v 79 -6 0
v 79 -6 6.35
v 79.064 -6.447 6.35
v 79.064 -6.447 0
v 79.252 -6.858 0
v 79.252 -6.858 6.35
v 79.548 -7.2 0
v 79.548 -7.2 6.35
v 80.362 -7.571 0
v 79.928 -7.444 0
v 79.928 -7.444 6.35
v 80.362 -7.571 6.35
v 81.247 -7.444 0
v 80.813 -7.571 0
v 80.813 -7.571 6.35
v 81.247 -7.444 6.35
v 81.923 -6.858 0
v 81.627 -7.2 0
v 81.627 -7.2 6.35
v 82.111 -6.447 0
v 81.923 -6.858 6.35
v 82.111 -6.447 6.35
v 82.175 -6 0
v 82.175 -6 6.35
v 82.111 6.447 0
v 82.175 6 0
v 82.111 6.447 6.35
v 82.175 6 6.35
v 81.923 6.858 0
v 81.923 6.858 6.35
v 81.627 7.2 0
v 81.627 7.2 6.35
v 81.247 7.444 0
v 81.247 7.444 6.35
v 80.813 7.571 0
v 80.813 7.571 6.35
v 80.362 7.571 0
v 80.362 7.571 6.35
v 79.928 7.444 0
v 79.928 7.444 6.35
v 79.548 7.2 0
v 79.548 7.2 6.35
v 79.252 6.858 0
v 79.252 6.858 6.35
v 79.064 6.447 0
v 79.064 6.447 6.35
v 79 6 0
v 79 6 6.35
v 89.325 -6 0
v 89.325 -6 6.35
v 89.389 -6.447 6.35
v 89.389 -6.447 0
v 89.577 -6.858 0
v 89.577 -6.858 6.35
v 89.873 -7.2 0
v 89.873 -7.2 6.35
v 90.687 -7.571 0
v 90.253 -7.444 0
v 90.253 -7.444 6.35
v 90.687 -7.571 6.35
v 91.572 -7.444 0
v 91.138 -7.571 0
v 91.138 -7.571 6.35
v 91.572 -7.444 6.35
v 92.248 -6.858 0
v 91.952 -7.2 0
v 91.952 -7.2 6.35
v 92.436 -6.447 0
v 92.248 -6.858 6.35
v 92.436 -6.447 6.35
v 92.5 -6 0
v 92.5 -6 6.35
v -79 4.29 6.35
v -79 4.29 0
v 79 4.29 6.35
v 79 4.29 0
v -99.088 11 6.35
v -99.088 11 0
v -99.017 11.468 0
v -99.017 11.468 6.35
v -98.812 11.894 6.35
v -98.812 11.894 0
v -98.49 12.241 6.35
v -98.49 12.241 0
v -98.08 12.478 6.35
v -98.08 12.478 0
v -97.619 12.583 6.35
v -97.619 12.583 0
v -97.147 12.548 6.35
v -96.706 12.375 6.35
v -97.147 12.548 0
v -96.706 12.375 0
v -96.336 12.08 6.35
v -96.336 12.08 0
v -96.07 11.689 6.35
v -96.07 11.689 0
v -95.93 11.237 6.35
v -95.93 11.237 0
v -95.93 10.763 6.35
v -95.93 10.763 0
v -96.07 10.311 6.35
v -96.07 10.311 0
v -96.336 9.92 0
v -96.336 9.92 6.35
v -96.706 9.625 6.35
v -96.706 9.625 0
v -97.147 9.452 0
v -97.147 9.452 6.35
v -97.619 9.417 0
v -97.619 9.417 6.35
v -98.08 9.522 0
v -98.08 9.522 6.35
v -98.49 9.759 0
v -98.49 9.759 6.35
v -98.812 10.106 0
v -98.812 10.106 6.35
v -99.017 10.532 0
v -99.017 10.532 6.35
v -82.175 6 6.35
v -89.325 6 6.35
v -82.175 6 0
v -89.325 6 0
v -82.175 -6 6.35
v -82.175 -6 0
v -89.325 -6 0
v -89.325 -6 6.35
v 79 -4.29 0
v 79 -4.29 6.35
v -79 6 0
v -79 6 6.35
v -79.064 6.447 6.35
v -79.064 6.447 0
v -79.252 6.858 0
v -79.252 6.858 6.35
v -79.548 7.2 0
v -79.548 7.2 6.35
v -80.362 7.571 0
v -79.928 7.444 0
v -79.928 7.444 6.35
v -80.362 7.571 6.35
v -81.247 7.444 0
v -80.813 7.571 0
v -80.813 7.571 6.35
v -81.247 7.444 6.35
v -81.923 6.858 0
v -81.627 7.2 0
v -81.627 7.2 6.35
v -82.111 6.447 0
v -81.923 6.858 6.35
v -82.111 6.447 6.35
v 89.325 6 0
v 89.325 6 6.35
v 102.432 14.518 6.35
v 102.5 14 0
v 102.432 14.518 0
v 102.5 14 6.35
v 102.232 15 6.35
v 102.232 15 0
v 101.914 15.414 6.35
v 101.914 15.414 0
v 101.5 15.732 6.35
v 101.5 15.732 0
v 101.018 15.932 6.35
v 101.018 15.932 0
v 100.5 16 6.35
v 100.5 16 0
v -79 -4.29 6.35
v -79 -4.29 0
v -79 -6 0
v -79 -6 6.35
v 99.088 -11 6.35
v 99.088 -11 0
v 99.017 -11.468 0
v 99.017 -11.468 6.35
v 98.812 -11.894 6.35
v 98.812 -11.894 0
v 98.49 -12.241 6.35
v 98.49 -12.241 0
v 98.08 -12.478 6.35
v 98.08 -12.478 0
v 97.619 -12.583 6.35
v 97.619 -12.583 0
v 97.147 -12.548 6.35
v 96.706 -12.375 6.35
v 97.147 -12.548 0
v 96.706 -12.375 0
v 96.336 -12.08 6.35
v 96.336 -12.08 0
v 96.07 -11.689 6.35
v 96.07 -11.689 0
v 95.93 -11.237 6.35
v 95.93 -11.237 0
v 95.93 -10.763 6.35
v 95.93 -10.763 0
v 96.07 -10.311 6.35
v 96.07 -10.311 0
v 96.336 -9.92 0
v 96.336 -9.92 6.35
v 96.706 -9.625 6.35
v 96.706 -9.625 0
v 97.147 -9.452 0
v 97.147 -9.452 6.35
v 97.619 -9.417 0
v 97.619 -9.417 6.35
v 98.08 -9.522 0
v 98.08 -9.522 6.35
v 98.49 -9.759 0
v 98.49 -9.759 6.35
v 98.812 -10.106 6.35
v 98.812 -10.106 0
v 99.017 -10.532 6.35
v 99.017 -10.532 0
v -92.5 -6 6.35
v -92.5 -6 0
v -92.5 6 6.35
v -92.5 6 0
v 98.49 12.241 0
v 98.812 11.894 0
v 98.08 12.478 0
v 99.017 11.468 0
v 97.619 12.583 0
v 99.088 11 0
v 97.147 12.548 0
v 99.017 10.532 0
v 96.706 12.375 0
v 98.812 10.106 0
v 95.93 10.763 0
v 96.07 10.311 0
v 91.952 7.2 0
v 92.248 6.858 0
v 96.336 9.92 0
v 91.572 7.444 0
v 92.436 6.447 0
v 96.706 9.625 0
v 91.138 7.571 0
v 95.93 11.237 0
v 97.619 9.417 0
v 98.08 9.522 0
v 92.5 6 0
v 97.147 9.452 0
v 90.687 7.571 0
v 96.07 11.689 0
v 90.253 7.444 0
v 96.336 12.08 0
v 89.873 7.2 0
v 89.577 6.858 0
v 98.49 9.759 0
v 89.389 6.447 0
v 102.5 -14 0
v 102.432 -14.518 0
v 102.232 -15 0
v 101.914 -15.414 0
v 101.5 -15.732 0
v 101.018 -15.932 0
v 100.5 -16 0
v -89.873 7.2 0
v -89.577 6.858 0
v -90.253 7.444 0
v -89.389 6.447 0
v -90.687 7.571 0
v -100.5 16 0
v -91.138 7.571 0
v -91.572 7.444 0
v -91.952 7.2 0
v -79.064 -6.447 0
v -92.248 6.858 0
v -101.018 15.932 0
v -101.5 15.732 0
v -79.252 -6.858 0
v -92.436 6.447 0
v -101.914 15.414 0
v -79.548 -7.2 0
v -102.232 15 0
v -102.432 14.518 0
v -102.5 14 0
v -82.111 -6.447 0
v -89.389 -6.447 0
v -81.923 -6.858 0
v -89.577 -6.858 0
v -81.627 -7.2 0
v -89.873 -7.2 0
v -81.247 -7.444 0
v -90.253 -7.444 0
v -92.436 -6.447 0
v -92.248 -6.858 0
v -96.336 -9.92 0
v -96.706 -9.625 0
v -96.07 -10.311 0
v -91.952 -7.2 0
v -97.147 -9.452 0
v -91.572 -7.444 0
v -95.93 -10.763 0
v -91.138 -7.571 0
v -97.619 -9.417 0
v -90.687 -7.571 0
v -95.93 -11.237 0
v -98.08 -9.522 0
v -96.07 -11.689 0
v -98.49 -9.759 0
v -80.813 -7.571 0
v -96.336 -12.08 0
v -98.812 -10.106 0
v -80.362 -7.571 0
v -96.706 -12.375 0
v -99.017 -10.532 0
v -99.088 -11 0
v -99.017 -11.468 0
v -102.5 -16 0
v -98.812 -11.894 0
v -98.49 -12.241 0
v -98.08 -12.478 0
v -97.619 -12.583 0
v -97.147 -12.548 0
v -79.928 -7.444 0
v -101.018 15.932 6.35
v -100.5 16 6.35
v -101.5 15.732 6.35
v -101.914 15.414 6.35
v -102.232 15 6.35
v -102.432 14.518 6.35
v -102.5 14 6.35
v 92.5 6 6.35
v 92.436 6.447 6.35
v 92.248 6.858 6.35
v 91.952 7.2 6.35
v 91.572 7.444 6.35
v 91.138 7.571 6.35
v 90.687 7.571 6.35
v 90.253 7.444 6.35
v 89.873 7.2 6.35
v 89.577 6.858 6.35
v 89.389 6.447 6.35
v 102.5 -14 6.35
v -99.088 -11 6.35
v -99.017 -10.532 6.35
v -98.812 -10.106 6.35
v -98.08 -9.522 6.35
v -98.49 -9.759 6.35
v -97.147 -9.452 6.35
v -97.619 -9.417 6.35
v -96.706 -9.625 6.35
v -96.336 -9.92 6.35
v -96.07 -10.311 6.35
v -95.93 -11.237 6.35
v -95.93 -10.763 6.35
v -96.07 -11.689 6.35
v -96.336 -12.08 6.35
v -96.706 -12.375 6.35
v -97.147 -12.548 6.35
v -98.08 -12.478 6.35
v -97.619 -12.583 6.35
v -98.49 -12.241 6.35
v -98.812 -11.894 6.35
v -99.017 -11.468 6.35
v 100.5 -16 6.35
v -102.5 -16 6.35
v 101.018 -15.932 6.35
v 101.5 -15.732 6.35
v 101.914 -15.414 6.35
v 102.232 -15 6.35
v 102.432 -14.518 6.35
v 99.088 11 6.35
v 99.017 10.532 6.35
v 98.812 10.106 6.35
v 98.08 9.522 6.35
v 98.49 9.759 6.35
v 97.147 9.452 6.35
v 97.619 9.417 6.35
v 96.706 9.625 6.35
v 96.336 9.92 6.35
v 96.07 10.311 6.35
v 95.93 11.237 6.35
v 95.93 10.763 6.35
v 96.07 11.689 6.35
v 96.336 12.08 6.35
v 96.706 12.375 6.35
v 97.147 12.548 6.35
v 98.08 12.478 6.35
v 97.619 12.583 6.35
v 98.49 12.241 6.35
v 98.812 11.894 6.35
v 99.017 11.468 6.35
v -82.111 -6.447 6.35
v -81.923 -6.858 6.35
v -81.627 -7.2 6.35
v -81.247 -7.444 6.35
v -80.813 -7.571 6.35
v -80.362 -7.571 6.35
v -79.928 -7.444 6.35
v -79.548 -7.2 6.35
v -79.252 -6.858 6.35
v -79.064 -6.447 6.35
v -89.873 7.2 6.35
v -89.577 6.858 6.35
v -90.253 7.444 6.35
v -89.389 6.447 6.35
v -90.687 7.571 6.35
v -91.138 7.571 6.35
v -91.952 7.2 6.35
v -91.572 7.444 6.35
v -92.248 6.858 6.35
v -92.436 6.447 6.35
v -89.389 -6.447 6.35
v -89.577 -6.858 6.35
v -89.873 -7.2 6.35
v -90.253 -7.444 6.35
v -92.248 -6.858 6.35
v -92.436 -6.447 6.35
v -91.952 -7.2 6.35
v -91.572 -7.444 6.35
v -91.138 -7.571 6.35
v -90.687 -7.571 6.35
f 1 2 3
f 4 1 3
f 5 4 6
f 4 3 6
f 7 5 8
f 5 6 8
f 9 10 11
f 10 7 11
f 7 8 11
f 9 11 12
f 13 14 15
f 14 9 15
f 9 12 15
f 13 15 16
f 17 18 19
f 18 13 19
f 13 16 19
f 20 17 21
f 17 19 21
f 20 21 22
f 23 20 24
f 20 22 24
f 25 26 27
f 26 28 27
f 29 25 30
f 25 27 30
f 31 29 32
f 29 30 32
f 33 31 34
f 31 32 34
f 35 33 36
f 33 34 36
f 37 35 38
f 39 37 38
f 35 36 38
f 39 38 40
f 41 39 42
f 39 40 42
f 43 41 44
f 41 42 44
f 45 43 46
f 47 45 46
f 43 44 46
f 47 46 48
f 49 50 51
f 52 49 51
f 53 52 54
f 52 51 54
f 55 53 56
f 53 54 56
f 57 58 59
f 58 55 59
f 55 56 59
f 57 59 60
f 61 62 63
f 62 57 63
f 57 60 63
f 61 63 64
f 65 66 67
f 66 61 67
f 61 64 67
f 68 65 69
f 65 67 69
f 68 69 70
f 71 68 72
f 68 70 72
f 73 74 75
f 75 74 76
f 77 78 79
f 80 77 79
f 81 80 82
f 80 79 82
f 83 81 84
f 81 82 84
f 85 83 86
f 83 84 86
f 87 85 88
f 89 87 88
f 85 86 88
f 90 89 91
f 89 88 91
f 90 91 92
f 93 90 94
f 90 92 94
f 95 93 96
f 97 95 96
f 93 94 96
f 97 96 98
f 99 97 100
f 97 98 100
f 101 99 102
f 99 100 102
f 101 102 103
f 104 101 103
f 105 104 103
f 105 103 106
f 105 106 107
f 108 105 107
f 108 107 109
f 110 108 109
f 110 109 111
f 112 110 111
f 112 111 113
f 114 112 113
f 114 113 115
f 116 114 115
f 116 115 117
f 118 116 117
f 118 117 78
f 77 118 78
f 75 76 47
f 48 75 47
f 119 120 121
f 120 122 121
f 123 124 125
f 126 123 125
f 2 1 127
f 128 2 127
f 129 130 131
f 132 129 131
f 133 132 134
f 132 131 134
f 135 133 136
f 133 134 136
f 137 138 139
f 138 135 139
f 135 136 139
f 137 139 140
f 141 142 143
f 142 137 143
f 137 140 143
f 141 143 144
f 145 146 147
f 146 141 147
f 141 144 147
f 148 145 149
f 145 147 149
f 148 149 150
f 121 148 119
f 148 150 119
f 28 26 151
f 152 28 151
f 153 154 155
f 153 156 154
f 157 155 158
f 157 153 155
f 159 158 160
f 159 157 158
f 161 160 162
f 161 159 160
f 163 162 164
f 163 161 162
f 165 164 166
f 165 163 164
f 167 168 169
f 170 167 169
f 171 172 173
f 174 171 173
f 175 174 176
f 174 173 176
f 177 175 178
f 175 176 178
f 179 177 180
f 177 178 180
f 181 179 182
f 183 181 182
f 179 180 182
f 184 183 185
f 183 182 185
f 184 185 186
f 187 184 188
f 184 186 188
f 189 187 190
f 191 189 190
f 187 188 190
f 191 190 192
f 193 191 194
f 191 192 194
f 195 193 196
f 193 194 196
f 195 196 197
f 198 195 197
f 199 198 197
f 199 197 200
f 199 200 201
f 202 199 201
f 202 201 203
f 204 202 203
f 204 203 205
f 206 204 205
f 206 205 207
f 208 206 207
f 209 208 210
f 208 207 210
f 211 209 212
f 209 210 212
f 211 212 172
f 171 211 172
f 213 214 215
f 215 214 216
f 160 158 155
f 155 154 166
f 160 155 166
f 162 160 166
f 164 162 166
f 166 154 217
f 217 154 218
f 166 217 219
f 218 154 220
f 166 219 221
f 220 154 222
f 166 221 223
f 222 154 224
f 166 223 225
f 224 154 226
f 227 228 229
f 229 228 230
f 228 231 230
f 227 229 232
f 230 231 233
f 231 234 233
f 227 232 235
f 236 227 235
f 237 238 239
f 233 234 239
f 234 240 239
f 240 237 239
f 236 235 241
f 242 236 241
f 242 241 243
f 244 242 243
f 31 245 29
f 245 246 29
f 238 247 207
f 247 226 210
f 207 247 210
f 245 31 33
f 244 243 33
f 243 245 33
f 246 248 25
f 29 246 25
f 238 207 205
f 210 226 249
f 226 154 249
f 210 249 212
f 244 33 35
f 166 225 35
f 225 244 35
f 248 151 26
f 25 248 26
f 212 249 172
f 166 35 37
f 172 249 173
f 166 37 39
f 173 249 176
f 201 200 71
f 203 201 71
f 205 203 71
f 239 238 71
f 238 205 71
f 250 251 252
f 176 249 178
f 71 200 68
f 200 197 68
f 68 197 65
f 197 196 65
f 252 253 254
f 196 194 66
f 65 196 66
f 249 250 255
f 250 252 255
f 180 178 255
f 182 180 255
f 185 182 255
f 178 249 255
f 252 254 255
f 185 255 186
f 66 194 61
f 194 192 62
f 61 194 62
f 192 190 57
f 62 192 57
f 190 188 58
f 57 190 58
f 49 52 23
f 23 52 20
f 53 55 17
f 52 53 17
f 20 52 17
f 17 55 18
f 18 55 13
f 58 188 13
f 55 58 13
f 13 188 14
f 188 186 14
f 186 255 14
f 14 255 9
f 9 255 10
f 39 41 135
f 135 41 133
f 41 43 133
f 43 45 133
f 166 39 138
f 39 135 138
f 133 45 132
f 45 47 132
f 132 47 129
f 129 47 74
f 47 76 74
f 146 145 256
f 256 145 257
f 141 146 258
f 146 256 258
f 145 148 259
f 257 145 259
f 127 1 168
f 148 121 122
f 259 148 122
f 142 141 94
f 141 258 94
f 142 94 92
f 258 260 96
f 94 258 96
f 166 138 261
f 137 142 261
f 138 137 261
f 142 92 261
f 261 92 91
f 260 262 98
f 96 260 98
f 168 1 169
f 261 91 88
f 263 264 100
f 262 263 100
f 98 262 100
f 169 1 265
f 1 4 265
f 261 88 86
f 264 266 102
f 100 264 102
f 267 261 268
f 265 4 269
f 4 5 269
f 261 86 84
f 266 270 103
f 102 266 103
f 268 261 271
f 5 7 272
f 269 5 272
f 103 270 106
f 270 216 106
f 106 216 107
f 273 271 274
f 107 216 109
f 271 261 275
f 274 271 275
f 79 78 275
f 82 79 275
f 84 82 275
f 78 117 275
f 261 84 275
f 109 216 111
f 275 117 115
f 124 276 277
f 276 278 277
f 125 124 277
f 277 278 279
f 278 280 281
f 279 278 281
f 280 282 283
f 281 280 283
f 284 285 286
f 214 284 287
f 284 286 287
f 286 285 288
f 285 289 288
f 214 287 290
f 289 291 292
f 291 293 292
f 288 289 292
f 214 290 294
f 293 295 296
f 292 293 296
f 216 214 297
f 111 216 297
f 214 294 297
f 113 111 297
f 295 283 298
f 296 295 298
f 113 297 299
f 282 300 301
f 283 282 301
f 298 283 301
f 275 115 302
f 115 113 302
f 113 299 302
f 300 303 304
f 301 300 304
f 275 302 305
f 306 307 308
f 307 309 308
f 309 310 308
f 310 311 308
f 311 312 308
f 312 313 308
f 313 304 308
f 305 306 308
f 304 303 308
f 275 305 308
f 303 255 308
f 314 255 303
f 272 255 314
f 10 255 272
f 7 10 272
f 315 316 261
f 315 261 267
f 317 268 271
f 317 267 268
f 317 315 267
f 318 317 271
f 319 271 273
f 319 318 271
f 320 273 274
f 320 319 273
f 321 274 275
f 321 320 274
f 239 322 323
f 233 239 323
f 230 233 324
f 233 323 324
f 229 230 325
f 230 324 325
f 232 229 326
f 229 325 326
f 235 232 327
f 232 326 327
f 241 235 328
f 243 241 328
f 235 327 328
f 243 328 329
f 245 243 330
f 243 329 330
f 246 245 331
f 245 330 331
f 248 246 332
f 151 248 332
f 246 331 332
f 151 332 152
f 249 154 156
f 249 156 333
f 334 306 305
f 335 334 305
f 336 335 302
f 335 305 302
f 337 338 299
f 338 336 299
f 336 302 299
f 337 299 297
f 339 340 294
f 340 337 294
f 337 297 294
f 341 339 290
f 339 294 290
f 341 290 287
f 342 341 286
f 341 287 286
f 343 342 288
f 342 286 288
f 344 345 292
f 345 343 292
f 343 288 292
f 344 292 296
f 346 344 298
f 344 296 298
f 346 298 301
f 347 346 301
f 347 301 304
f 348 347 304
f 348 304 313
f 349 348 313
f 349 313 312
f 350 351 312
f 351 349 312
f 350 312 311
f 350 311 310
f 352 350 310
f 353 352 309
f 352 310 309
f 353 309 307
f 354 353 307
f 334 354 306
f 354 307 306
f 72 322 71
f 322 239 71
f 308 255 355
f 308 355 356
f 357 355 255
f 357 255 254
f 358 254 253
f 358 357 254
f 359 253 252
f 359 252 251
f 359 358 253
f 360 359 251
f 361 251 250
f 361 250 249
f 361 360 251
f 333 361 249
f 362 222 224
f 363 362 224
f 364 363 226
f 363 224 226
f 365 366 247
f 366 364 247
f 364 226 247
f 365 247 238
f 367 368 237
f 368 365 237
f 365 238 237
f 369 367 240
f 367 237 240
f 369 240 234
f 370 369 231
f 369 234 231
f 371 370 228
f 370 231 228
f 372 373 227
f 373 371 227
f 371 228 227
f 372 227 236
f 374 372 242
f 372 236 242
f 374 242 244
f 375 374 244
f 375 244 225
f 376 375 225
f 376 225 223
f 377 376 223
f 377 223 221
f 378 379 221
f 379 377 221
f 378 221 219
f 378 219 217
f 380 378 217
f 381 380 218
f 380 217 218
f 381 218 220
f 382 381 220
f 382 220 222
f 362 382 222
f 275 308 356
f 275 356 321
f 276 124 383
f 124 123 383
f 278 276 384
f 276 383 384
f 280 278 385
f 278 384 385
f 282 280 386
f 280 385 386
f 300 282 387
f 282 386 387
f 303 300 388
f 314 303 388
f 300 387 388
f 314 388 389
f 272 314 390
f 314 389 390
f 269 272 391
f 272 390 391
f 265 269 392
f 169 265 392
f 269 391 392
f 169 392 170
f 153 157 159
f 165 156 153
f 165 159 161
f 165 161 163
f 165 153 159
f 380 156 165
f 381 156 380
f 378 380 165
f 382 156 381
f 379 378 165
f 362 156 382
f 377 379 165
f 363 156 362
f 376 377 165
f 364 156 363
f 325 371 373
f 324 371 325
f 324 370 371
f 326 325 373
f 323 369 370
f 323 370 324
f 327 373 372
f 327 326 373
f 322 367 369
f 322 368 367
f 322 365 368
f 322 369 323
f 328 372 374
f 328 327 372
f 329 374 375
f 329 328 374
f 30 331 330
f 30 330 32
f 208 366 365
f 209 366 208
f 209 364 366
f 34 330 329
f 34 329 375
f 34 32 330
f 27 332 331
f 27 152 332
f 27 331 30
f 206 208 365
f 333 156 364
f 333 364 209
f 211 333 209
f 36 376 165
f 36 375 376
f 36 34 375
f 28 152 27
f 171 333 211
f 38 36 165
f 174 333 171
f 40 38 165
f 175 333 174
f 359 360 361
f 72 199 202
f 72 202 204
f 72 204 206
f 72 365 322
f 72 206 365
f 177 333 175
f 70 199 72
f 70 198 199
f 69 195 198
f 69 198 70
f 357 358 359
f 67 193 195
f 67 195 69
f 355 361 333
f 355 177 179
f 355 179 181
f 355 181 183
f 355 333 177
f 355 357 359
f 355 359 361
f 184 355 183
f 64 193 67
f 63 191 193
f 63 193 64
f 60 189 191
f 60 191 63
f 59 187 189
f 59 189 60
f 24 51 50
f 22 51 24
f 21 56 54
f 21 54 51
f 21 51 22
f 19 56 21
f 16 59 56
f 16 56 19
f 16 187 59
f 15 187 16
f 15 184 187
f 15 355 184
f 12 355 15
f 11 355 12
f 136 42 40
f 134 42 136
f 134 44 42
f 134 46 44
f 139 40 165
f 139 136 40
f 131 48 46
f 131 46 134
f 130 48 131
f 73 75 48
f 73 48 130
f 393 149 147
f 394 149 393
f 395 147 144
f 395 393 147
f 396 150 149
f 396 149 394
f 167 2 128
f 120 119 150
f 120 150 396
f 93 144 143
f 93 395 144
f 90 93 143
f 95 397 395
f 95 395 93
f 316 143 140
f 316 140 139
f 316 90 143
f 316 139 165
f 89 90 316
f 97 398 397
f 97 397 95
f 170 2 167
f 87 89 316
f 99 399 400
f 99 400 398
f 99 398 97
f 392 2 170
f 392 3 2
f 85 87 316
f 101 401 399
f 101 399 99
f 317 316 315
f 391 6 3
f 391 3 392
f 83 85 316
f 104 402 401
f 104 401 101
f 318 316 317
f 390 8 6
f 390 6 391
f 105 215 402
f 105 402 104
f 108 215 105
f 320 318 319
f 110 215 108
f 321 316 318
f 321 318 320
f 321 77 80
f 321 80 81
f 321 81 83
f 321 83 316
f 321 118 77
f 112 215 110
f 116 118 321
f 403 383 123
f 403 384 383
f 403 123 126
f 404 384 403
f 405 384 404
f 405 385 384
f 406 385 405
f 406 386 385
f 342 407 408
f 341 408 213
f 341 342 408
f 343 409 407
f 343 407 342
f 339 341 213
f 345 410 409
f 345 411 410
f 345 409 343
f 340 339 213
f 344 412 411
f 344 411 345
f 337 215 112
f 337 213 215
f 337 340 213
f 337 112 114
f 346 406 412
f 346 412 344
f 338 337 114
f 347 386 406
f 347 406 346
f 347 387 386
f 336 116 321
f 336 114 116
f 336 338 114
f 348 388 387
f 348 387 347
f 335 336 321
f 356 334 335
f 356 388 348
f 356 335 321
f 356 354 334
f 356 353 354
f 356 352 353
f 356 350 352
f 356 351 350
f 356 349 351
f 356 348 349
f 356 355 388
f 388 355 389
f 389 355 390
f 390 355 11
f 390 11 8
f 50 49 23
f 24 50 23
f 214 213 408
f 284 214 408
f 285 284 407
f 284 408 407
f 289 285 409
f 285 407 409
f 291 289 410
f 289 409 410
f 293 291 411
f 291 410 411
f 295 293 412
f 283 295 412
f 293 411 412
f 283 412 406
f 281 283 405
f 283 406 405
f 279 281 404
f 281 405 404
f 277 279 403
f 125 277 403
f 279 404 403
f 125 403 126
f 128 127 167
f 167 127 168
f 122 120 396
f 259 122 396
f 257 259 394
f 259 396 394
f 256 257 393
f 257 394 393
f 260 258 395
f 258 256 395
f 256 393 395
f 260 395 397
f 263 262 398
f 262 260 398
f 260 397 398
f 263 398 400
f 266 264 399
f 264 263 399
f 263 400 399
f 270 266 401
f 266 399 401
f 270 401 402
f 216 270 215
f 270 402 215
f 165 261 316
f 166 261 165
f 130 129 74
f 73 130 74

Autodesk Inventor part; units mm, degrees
ref_plane "YZ Plane" through (0, 0, 0) normal (1, 0, 0) x (0, 1, 0)
ref_plane "XZ Plane" through (0, 0, 0) normal (0, 1, 0) x (-1, 0, 0)
ref_plane "XY Plane" through (0, 0, 0) normal (0, 0, 1) x (1, 0, 0)
sketch "Sketch1" plane through (0, 0, 0) normal (0, 0, 1) x (1, 0, 0)
  line L0 (0, 0) -> (102.5, 0)
  line L1 (0, 0) -> (0, 16)
  line L2 (0, 4.2898) -> (79, 4.2898)
  line L3 (79, 4.2898) -> (79, 6)
  line L4 (79, 6) -> (92.5, 6)
  line L5 (92.5, 6) -> (92.5, 0)
  line L6 (0, 16) -> (102.5, 16)
  line L7 (102.5, 16) -> (102.5, 0)
  circle A0 centre (97.5, 11) radius 1.5875
  dimension "d0" = 13.5
  dimension "d1" = 12
  dimension "d2" = 8.5796
  dimension "d3" = 185
  dimension "d4" = 10
  dimension "d5" = 10
  dimension "d6" = 3.175
  dimension "d7" = 5
  dimension "d8" = 5
extrude "Extrusion1" add sketch "Sketch1" along normal blind 6.35 contours L5 L4 L3 L2 L1 L6 L7 L0
sketch "Sketch2" plane through (0, 0, 6.35) normal (0, 0, 1) x (1, 0, 0)
  line L0 (79, 4.2898) -> (79, 6) projected
  line L1 (79, 6) -> (92.5, 6) projected
  line L2 (92.5, 6) -> (92.5, 0) projected
  arc A0 (82.175, 6) -> (79, 6) centre (80.5875, 6) ccw
  arc A1 (92.5, 6) -> (89.325, 6) centre (90.9125, 6) ccw
  point P0 (0, 0)
  dimension "d12" = 1.5875
extrude "Extrusion2" cut sketch "Sketch2" against normal up to next
fillet "Fillet1" radius 2 1 edges at (102.5, 16, 3.175)
mirror "Mirror1" about plane through (92.5, 0, 0) normal (0, -1, 0) of "Extrusion1", "Fillet1", "Extrusion2"
mirror "Mirror2" about plane through (0, -16, 0) normal (-1, 0, 0) of "Extrusion1", "Fillet1", "Mirror1", "Extrusion2"
properties part number "Arrow_Arm_Template"
